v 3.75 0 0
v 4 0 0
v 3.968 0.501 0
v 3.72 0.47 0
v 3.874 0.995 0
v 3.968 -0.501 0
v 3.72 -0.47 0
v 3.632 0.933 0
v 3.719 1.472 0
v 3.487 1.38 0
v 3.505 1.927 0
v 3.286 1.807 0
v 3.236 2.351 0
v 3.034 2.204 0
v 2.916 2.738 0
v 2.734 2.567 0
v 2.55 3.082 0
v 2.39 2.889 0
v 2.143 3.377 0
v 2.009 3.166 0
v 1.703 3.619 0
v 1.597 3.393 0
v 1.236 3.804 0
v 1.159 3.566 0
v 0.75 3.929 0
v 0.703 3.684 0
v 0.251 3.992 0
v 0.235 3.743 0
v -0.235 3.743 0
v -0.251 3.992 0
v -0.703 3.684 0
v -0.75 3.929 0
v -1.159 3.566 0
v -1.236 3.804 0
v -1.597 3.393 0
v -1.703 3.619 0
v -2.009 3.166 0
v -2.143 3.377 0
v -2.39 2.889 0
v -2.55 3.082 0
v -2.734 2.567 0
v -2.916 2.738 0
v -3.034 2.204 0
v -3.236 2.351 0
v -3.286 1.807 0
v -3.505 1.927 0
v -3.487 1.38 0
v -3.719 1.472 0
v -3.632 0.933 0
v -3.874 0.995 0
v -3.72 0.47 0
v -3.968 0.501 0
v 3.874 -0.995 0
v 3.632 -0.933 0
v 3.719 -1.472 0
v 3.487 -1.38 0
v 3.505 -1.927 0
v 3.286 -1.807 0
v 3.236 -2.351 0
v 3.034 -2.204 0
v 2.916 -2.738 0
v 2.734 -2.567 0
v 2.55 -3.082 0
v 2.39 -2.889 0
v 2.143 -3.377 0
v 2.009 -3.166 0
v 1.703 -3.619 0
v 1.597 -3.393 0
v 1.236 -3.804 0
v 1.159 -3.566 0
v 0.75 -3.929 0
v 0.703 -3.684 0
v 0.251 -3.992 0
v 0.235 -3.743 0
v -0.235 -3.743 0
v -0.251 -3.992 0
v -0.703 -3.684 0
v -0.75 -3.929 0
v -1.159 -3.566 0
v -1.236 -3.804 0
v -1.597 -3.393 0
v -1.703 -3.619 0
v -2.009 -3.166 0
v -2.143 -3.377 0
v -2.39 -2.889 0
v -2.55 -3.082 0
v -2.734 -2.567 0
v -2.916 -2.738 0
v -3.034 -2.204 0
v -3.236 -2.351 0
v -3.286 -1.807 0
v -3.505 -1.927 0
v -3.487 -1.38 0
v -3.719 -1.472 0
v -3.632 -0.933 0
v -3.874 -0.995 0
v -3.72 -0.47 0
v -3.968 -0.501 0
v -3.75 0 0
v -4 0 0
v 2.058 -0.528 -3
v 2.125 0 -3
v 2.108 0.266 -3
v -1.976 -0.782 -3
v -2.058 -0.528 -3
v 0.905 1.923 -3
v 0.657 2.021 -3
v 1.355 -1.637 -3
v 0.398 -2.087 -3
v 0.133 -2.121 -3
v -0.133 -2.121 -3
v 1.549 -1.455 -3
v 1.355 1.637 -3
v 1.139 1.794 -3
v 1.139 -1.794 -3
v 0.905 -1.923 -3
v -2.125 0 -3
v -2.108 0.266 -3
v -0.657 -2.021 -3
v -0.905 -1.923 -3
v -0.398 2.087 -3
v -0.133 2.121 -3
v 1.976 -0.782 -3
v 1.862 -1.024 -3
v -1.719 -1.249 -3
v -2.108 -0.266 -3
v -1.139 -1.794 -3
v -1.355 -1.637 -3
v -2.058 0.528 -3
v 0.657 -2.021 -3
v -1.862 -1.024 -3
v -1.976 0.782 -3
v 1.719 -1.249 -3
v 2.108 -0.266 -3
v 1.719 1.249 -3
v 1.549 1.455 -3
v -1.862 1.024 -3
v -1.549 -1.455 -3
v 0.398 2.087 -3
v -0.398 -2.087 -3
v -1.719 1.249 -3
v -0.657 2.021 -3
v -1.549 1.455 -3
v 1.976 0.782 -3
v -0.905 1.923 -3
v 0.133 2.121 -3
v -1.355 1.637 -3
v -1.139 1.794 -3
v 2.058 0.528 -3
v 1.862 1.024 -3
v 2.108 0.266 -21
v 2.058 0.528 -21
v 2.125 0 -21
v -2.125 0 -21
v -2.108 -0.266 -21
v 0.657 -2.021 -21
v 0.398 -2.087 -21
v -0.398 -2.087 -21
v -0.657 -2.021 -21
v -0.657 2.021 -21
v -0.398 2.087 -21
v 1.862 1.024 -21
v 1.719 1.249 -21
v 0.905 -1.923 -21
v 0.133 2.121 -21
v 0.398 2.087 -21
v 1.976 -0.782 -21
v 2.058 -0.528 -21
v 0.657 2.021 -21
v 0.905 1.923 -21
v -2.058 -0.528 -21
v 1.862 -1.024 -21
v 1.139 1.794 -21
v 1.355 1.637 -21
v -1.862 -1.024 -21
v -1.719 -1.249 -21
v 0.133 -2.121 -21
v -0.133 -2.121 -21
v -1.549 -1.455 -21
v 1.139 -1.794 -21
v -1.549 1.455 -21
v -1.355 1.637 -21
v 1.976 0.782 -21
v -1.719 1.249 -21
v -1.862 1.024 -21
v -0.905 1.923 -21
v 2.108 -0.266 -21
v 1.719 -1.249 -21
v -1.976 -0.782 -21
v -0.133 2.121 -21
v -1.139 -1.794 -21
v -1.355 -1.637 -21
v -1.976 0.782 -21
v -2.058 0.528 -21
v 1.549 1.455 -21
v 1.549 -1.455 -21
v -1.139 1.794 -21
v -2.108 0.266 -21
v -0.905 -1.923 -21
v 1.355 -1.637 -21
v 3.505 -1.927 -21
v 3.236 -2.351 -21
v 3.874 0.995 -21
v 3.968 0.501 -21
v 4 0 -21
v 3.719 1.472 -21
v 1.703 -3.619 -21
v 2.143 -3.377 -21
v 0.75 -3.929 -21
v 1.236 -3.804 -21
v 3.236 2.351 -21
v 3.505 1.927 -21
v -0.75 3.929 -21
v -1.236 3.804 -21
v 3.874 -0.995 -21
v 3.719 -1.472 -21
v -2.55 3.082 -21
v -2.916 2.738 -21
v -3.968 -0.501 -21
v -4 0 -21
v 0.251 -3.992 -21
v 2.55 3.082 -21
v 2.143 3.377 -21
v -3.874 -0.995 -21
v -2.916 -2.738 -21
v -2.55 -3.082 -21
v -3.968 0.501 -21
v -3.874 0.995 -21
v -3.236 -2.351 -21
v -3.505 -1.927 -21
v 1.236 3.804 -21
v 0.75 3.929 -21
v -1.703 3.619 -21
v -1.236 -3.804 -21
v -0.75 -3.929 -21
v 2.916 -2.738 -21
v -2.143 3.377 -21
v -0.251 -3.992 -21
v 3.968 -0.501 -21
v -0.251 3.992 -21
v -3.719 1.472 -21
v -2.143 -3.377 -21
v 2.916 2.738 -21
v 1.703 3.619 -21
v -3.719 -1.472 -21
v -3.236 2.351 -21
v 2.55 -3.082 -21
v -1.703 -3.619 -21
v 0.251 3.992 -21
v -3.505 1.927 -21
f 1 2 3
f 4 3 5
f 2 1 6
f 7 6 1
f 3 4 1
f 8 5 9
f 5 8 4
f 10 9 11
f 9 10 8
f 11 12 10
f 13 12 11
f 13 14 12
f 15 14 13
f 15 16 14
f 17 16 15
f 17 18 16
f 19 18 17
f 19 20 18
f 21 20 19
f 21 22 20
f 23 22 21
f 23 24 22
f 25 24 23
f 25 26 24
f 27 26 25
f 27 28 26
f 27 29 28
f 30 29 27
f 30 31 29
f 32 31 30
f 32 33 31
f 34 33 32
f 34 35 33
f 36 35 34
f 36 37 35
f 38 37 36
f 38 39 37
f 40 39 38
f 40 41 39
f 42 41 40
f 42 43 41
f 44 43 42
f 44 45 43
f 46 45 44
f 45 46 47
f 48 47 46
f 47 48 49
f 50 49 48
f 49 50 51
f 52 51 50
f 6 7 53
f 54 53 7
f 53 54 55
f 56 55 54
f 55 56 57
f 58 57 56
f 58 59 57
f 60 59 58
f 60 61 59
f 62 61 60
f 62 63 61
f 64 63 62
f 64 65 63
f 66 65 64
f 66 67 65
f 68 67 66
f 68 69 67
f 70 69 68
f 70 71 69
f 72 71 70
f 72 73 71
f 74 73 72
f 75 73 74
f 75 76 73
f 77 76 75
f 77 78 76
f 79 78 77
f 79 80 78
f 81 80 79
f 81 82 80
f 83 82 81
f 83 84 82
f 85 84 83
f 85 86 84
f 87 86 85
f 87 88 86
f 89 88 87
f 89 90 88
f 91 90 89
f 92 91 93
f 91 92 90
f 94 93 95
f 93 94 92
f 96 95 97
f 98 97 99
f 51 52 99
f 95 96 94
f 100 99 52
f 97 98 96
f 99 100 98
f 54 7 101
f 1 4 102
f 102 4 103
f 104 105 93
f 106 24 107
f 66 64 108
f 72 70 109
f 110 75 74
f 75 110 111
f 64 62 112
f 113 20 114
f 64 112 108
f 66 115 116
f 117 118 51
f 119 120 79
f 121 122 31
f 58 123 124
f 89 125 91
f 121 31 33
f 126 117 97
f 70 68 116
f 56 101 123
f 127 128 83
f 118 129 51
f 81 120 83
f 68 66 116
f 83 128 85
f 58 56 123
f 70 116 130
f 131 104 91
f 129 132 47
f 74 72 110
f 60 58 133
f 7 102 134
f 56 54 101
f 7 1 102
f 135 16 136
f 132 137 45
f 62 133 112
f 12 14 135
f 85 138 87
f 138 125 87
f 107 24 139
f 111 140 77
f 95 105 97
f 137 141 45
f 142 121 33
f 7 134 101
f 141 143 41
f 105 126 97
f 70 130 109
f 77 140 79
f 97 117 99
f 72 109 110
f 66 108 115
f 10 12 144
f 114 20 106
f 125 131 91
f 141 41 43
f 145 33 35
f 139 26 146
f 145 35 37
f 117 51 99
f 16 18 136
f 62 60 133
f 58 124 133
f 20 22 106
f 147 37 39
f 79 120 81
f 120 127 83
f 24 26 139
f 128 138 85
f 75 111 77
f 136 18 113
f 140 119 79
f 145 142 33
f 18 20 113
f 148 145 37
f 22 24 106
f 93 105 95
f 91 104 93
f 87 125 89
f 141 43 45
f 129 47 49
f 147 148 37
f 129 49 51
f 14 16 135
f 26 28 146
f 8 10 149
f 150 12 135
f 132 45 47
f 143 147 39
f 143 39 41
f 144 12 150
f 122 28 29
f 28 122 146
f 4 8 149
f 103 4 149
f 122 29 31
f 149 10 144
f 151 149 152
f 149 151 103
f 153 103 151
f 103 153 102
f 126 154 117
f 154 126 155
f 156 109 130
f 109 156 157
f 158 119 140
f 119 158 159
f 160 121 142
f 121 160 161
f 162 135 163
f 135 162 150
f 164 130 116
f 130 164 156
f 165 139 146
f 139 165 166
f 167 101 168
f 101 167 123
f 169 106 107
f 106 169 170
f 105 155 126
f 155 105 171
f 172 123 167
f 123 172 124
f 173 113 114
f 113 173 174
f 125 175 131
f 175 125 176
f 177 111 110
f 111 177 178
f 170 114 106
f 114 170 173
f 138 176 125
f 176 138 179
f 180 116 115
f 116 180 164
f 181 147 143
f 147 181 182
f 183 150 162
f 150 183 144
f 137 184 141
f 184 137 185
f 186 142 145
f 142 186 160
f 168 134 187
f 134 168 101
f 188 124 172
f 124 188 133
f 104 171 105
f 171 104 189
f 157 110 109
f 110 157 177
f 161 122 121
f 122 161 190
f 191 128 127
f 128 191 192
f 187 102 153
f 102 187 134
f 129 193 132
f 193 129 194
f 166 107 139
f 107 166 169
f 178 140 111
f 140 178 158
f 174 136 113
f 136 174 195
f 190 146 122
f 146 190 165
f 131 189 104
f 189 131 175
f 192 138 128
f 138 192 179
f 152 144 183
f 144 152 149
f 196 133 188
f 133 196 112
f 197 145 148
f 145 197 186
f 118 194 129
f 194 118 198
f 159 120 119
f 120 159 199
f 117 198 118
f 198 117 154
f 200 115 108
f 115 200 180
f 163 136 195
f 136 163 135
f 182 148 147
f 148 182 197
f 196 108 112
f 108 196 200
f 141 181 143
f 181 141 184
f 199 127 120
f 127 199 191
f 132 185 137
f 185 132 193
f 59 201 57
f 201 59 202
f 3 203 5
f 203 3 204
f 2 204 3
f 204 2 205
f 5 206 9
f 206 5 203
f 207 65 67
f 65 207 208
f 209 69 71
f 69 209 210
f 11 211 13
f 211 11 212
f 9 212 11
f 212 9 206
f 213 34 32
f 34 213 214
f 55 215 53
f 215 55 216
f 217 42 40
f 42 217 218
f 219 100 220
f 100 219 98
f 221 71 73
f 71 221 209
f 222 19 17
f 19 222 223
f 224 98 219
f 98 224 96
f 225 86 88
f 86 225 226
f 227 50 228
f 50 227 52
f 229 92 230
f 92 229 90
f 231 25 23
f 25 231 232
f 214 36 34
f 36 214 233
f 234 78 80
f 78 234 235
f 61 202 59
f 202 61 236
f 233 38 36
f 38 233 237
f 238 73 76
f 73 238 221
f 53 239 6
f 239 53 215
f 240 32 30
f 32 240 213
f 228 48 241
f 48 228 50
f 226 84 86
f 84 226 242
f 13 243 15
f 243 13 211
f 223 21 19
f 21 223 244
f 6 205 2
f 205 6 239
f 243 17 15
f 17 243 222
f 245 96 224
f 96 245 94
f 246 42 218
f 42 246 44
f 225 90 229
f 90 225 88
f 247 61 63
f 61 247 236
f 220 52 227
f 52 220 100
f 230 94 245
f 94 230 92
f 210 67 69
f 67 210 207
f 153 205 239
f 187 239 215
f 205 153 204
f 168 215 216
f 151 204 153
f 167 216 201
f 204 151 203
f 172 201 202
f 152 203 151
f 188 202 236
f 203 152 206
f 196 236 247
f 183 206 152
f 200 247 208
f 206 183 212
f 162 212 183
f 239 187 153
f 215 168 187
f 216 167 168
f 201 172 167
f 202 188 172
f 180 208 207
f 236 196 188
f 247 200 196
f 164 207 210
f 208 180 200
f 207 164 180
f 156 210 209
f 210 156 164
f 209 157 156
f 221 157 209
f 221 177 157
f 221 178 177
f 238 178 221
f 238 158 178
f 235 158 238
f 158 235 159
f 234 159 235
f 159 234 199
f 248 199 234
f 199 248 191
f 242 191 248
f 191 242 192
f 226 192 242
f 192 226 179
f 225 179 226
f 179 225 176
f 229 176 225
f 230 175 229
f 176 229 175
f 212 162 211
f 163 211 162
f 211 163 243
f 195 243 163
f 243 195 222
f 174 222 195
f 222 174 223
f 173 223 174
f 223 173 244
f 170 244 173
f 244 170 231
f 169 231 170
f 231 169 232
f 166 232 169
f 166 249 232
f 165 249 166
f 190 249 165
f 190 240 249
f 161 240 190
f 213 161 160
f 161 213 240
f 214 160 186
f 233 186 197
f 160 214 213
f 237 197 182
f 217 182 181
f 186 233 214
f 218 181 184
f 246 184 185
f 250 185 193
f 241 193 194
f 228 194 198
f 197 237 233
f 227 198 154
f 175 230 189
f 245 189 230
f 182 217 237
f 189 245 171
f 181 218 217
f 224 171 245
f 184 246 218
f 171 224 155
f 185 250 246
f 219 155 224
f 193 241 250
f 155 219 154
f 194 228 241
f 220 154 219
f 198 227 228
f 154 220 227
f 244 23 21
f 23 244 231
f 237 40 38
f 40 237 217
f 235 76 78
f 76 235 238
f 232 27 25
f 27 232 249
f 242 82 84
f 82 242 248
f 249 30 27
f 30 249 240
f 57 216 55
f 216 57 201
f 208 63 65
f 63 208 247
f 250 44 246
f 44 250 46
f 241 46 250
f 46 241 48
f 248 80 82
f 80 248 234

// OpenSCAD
$fn = 50;

difference() {
	union() {
		translate(v = [0, 0, -21.0]) {
			cylinder(h = 21, r = 4.0);
		}
	}
	union() {
		translate(v = [0, 0, 0]) {
			rotate(a = [0, 0, 0]) {
				difference() {
					union() {
						translate(v = [0, 0, -24.0]) {
							cylinder(h = 24, r = 2.0);
						}
						translate(v = [0, 0, -3]) {
							cylinder(h = 3, r1 = 2.125, r2 = 3.75);
						}
						translate(v = [0, 0, -24.0]) {
							cylinder(h = 24, r = 2.125);
						}
						translate(v = [0, 0, -24.0]) {
							cylinder(h = 24, r = 2.0);
						}
					}
					union();
				}
			}
		}
	}
}
